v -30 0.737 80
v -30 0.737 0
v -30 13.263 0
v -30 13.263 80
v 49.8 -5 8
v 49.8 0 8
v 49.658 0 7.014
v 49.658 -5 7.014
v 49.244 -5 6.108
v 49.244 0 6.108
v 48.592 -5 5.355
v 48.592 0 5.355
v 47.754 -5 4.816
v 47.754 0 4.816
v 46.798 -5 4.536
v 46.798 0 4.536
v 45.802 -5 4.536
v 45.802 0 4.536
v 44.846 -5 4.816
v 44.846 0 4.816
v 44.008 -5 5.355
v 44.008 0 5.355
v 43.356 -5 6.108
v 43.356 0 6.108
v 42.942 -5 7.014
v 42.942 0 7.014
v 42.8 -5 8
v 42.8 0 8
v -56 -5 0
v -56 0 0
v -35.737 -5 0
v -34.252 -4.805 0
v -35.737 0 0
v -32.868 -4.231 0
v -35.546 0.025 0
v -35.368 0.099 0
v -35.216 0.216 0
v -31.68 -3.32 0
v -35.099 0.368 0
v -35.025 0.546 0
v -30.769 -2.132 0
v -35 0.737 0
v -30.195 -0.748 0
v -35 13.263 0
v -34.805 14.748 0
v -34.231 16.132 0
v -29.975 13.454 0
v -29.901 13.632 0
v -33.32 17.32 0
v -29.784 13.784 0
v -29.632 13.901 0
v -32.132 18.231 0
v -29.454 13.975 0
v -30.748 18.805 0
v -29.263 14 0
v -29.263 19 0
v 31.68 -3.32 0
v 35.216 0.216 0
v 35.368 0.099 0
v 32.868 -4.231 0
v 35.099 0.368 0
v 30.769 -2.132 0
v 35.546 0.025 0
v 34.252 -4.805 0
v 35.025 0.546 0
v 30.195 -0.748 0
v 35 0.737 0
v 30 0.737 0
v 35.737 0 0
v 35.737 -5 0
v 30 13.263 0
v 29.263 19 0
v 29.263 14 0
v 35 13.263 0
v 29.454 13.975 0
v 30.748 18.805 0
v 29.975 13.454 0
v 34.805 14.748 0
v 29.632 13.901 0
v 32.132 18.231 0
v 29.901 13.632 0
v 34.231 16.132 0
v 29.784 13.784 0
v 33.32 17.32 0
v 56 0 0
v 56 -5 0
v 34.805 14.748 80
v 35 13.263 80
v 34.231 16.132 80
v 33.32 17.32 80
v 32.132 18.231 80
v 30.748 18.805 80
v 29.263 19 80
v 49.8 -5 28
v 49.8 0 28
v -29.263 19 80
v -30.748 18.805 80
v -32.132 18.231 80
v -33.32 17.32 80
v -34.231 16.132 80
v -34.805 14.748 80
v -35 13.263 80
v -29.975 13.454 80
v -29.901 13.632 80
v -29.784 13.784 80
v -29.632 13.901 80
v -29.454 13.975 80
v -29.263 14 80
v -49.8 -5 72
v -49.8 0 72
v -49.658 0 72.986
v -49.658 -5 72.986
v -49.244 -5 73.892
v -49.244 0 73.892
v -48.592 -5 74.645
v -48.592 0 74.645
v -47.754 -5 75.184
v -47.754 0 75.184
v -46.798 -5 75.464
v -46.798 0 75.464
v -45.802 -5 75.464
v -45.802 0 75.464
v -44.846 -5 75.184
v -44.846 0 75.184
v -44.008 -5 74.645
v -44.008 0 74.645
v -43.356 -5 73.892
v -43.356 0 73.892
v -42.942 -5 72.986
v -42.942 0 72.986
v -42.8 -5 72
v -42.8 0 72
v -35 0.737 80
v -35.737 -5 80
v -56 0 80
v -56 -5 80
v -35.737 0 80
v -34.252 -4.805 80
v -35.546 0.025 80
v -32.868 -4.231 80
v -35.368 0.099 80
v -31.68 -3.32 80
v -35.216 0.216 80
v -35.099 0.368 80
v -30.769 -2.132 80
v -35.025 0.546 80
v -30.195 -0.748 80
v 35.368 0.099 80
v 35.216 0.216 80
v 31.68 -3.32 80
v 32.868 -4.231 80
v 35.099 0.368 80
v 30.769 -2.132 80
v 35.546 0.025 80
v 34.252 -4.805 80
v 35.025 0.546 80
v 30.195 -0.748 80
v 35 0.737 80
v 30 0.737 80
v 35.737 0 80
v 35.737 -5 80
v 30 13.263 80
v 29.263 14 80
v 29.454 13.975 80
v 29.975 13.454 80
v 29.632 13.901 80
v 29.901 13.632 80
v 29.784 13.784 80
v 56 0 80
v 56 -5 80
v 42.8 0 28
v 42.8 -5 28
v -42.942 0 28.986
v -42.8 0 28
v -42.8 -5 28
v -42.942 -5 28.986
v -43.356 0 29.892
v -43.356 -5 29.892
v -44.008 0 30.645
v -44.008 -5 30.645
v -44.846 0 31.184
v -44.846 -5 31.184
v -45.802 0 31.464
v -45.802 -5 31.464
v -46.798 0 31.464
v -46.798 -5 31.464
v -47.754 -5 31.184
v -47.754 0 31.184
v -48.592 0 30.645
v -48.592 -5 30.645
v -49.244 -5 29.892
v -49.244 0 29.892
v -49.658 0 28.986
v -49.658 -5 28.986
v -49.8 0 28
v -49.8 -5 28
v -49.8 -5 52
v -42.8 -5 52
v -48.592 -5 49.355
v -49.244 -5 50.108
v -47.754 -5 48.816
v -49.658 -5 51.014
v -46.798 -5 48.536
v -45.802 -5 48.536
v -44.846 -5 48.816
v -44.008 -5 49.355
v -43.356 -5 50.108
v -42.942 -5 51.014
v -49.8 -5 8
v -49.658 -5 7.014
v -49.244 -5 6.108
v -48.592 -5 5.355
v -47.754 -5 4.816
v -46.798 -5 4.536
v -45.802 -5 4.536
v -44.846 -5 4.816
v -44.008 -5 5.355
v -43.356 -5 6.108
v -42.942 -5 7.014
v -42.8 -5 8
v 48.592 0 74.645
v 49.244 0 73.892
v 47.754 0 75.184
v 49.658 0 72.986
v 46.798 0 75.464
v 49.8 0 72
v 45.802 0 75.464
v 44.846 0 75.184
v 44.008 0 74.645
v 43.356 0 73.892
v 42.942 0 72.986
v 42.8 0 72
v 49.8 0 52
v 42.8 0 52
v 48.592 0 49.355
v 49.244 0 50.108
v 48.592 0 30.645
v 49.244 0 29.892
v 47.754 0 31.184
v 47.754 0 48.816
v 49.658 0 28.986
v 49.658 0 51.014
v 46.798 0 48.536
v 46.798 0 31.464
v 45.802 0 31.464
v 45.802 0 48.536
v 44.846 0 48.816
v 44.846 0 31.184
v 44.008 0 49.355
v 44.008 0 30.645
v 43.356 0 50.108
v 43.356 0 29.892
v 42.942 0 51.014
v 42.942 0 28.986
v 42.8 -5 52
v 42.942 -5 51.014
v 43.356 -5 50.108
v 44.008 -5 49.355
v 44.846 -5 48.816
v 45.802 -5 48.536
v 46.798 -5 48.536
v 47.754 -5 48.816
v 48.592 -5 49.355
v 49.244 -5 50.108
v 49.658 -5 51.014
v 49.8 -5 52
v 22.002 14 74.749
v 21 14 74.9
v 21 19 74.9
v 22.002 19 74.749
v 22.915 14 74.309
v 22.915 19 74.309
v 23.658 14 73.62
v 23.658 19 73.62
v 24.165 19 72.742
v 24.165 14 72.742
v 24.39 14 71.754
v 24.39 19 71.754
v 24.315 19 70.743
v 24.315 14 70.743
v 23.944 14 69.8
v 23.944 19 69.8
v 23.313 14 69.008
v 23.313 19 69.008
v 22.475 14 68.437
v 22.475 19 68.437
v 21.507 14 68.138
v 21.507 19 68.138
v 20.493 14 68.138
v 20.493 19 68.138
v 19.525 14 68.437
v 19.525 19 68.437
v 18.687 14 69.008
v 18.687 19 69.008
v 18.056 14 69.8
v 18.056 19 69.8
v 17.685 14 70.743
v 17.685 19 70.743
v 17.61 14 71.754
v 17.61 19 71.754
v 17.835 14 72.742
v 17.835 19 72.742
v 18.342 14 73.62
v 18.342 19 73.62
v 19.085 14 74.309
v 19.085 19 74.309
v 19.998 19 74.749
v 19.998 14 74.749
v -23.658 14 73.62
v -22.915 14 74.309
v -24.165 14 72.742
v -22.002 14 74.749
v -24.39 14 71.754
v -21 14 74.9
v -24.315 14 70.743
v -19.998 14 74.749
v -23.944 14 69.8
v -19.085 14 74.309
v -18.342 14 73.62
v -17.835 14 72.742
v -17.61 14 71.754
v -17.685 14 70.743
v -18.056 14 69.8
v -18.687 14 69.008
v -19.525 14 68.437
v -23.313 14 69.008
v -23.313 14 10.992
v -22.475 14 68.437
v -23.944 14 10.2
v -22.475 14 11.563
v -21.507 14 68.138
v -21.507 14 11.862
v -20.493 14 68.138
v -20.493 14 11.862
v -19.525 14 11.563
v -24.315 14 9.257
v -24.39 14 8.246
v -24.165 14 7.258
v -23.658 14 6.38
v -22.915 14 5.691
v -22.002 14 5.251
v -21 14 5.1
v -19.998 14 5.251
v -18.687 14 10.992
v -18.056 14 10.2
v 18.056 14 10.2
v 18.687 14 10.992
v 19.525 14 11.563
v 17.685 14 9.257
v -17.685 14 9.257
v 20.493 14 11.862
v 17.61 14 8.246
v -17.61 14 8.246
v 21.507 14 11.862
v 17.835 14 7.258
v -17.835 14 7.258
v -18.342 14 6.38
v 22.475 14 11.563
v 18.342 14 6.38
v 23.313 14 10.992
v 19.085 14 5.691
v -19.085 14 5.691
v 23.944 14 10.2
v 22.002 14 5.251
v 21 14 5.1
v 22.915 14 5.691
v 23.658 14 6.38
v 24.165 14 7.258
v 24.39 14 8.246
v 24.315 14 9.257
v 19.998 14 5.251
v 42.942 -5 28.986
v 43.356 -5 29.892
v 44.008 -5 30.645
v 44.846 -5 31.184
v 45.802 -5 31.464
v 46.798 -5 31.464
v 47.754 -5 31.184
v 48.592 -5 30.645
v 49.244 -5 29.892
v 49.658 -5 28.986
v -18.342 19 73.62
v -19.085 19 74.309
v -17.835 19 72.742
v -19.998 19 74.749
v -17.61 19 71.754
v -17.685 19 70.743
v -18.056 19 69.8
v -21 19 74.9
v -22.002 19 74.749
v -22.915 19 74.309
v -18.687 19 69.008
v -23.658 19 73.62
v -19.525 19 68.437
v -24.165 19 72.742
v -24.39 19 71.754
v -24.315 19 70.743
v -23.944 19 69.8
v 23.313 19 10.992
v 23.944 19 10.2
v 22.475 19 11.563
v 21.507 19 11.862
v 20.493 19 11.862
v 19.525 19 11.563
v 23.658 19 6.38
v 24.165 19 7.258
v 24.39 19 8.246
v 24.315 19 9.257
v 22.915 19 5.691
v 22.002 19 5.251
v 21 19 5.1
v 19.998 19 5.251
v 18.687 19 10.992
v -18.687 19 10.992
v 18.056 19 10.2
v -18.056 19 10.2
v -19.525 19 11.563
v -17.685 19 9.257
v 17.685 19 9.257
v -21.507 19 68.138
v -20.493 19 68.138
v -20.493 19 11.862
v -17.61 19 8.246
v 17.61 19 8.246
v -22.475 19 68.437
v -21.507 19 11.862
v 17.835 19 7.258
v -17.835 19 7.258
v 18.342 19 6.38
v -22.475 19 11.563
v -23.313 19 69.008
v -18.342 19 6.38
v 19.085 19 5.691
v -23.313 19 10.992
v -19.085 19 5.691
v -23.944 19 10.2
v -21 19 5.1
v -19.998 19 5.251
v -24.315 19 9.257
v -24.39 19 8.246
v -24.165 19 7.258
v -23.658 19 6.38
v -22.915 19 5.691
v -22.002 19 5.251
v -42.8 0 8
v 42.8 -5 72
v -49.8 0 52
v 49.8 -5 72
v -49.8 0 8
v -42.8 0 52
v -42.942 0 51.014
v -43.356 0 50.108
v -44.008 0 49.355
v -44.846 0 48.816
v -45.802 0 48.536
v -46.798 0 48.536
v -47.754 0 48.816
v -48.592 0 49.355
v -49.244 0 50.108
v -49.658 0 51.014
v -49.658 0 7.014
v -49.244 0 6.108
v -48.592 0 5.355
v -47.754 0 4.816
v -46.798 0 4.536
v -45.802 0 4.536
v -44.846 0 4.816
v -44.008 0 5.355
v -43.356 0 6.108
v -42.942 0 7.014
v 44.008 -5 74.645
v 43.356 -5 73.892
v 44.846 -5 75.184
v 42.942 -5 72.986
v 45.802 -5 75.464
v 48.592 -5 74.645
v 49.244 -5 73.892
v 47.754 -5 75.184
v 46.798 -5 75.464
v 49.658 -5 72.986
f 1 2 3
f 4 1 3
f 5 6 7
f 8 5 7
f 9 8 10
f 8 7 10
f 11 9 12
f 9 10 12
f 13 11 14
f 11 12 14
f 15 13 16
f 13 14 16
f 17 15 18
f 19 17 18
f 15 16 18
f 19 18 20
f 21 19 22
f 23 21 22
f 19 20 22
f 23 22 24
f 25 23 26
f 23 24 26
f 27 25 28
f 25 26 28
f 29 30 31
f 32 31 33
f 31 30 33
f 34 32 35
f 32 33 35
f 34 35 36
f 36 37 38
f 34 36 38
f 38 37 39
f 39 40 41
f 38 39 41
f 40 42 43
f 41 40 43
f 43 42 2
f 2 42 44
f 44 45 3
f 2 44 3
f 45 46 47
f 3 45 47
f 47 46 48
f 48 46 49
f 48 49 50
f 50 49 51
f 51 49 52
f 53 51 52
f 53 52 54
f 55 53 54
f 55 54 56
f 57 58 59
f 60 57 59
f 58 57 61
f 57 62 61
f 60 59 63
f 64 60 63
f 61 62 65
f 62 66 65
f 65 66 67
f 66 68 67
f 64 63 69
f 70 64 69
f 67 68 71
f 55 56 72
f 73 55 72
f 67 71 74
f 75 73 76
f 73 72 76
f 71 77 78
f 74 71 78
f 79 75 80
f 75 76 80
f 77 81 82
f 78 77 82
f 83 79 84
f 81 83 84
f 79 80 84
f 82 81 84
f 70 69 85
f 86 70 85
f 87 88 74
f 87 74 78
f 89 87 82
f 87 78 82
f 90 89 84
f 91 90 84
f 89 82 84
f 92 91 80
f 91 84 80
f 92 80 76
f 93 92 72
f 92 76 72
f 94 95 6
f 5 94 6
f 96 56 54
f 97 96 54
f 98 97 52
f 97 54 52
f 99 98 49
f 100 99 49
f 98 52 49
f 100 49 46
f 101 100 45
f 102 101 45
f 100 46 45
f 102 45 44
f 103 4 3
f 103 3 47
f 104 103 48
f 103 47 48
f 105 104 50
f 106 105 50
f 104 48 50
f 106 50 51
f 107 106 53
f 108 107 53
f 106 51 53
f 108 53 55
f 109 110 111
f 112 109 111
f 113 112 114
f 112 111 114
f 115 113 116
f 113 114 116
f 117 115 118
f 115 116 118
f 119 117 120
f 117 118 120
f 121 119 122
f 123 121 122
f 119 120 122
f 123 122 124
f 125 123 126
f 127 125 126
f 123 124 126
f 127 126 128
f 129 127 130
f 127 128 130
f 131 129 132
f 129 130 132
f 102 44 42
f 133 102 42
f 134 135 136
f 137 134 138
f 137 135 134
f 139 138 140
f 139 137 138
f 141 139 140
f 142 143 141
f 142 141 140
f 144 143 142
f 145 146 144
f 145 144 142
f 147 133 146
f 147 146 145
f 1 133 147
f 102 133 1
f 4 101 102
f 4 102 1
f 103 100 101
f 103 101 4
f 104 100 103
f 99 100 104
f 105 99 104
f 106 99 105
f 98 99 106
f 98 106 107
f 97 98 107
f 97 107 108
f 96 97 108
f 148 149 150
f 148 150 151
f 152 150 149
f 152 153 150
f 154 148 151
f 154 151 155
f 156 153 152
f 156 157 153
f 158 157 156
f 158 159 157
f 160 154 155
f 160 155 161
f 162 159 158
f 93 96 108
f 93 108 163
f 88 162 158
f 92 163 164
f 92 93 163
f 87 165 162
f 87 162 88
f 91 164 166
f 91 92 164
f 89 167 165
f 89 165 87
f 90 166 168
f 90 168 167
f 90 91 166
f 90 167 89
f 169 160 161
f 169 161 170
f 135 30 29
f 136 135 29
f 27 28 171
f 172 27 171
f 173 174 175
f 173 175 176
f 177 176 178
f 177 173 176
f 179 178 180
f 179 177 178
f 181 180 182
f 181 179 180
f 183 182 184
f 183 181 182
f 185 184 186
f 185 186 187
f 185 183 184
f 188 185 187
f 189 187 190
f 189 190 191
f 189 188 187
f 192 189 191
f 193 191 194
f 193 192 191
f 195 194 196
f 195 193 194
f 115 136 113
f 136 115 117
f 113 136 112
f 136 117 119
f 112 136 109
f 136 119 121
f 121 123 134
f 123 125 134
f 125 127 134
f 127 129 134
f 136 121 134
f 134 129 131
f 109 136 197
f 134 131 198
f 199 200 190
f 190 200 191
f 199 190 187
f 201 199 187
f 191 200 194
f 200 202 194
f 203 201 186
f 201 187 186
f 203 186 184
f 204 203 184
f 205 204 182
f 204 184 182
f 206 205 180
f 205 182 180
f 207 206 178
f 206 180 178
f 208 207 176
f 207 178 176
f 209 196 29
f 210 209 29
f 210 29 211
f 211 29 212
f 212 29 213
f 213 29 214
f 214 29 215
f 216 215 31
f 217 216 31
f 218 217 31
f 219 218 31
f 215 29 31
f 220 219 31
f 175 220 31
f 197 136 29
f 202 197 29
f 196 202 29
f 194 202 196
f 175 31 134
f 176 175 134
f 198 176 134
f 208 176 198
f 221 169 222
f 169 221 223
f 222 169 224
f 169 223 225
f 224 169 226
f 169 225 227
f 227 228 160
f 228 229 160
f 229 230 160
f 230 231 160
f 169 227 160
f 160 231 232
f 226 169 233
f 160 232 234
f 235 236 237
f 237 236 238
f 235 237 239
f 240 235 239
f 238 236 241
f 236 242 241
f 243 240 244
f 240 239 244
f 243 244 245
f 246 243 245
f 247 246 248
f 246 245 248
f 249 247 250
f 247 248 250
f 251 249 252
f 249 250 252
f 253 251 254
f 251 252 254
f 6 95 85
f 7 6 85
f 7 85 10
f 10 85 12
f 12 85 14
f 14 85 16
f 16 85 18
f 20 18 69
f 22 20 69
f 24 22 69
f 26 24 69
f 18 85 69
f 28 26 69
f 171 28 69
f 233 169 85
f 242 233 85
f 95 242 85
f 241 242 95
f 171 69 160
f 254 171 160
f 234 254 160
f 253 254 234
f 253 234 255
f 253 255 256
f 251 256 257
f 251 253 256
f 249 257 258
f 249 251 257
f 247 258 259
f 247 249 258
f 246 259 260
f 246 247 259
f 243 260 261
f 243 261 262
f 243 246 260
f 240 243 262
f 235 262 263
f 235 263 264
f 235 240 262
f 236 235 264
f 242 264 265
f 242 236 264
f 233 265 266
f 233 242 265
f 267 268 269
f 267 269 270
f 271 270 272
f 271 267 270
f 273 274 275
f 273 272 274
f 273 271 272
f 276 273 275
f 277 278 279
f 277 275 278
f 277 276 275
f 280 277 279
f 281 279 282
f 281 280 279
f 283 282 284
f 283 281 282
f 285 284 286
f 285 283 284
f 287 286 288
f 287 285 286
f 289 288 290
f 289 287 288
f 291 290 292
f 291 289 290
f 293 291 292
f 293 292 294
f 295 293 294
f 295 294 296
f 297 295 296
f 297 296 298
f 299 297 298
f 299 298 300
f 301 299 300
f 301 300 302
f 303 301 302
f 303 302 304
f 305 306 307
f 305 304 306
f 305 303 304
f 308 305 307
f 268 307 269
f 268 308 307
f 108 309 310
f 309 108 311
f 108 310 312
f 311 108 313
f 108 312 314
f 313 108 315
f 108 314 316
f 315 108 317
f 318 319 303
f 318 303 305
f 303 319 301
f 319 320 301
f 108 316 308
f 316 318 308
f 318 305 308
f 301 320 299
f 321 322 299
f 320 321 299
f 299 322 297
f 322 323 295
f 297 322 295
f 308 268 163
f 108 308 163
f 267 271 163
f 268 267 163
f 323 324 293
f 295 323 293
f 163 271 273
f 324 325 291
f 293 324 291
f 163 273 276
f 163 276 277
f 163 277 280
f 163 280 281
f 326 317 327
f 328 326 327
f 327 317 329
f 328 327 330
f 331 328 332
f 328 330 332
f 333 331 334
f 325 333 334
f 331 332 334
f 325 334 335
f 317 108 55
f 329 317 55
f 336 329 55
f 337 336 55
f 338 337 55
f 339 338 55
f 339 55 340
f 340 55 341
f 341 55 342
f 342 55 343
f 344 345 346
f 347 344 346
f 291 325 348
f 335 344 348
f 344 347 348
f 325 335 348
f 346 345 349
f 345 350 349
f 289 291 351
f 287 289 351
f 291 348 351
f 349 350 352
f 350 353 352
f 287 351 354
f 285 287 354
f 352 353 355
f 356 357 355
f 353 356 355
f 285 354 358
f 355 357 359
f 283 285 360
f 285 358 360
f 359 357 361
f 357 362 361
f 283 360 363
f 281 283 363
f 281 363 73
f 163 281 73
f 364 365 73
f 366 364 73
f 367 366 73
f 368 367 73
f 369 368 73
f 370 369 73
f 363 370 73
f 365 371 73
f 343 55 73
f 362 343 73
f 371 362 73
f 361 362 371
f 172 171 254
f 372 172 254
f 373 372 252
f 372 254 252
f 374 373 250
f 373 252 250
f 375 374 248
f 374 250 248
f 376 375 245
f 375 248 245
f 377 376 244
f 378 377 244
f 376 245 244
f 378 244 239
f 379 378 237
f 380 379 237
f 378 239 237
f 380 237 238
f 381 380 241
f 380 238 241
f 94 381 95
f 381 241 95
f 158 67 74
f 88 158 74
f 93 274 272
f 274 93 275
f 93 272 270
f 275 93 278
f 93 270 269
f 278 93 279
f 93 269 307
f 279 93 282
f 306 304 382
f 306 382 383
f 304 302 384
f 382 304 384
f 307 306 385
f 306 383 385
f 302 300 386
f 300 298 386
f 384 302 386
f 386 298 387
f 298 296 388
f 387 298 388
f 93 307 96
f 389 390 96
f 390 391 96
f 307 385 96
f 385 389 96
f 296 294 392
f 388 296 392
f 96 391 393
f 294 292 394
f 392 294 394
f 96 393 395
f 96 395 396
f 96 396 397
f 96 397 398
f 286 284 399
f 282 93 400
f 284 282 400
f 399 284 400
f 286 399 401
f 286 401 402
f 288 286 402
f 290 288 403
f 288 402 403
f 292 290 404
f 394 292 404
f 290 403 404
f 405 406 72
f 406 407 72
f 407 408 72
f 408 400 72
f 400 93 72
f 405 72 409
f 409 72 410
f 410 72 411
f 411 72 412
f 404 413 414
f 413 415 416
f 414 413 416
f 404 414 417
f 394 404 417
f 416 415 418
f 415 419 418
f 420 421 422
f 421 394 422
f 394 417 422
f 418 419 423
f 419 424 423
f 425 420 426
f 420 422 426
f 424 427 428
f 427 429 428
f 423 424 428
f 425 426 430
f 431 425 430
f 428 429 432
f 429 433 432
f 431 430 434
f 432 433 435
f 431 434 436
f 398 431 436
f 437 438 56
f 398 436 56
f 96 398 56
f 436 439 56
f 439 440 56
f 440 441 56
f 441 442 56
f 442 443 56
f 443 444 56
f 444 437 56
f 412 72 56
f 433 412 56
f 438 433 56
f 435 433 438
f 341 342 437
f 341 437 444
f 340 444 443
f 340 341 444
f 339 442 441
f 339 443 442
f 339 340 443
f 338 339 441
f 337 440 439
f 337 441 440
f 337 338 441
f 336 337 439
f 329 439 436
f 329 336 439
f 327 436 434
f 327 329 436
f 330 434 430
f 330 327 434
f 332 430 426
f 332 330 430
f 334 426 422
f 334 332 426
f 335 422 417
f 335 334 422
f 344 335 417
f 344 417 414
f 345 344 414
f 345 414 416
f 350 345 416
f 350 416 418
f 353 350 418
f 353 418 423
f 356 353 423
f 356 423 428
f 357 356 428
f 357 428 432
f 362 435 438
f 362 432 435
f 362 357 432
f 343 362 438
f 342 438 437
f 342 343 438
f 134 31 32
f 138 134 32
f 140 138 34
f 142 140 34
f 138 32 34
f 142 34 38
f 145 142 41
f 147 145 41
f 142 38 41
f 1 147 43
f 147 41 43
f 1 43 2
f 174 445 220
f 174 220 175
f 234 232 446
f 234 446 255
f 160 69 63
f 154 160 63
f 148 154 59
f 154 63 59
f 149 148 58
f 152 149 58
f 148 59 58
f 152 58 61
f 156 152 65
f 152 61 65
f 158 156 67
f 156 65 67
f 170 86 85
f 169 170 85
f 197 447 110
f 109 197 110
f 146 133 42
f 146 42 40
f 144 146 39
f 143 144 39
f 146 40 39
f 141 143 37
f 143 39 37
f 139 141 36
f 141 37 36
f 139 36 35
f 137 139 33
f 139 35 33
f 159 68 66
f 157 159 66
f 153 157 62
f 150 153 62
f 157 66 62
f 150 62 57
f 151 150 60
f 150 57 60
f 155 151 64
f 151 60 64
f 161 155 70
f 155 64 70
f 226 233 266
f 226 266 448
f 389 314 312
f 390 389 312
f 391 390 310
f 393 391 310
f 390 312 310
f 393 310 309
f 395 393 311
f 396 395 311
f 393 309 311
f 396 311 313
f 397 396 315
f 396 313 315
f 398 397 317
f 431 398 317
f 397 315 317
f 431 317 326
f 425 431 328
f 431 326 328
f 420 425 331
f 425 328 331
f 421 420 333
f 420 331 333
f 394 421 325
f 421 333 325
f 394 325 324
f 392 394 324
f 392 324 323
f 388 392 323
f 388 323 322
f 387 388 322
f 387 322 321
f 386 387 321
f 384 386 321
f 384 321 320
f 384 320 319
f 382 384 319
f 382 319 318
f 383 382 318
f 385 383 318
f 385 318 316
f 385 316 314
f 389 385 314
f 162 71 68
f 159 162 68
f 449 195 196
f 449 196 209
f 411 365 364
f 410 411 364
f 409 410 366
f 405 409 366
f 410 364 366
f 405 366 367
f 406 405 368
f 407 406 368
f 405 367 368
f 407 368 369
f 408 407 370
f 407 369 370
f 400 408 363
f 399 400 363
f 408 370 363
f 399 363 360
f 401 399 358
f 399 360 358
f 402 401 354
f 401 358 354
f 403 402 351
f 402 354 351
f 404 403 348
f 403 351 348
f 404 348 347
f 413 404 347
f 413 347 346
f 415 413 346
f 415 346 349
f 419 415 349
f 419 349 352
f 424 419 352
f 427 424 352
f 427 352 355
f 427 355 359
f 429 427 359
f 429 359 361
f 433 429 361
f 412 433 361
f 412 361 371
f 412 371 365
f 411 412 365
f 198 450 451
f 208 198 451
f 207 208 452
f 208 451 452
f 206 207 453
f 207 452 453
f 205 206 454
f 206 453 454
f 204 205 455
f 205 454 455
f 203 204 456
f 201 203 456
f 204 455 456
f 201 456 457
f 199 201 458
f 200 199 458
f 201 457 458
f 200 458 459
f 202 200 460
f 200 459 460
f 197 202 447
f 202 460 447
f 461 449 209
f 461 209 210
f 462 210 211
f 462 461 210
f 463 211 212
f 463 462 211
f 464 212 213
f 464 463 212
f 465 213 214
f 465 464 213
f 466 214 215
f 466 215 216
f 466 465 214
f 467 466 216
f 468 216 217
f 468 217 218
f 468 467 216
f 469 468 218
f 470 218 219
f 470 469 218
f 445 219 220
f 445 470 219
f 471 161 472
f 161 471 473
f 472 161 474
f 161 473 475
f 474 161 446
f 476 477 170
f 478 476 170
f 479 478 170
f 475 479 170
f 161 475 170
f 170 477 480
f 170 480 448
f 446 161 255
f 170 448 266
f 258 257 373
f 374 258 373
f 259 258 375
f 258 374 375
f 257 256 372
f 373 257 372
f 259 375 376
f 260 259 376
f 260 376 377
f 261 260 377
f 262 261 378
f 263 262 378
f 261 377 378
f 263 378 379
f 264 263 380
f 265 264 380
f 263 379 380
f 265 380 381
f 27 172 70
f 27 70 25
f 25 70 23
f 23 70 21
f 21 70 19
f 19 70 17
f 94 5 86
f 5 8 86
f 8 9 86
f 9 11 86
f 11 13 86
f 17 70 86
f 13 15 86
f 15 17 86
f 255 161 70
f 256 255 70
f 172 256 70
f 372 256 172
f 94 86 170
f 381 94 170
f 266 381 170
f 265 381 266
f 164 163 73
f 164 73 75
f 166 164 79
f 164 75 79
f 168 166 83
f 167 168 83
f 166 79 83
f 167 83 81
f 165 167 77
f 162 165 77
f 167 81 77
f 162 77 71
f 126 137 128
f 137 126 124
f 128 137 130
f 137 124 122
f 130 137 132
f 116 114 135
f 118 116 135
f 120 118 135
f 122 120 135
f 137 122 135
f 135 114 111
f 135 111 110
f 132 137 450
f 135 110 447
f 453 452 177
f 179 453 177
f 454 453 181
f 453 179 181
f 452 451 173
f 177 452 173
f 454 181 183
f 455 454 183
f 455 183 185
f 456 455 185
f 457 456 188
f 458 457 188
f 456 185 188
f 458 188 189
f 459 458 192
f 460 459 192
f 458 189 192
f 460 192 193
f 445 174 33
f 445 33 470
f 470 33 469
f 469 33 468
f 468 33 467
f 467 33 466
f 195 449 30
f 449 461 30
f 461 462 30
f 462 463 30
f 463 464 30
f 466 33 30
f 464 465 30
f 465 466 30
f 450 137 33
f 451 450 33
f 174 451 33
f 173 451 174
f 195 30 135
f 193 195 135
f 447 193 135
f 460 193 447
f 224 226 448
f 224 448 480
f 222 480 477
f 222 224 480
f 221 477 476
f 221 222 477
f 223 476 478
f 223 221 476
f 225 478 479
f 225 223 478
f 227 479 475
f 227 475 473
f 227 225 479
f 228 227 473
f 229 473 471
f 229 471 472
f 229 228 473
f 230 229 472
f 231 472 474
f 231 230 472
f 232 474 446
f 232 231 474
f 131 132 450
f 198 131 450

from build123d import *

# Parameters (mm, degrees)
SM_BASE_FLANGE_1_DEPTH  = 80
HOLE_WIZARD_6_8_6_8_2_D = 6.8
CUT_EXTRUDE_3_DEPTH     = 5
MIRROR_5_COPY_1_D       = 6.8
MIRROR_5_COPY_2_DEPTH   = 5


# Sheet-metal steps are written as plain solids
with BuildPart() as part:
    # 草图3 → 基体-法兰1 (new body)
    with BuildSketch(Plane.XY):
        with BuildLine():
            Line((56, 0), (35.7366, 0))
            ThreePointArc((35.7366, 0), (35.215745145, 0.215745145), (35, 0.7366))
            Line((35, 0.7366), (35, 13.2634))
            ThreePointArc((35, 13.2634), (33.319788761, 17.319788761), (29.2634, 19))
            Line((29.2634, 19), (-29.2634, 19))
            ThreePointArc((-29.2634, 19), (-33.319788761, 17.319788761), (-35, 13.2634))
            Line((-35, 13.2634), (-35, 0.7366))
            ThreePointArc((-35, 0.7366), (-35.215745145, 0.215745145), (-35.7366, 0))
            Line((-35.7366, 0), (-56, 0))
            Line((-56, 0), (-56, -5))
            Line((-56, -5), (-35.7366, -5))
            ThreePointArc((-35.7366, -5), (-31.680211239, -3.319788761), (-30, 0.7366))
            Line((-30, 0.7366), (-30, 13.2634))
            ThreePointArc((-30, 13.2634), (-29.784254855, 13.784254855), (-29.2634, 14))
            Line((-29.2634, 14), (29.2634, 14))
            ThreePointArc((29.2634, 14), (29.784254855, 13.784254855), (30, 13.2634))
            Line((30, 13.2634), (30, 0.7366))
            ThreePointArc((30, 0.7366), (31.680211239, -3.319788761), (35.7366, -5))
            Line((35.7366, -5), (56, -5))
            Line((56, -5), (56, 0))
        make_face()
    extrude(amount=SM_BASE_FLANGE_1_DEPTH)

    # Ø6.8 (6.8) 直径孔2 (through all)
    with Locations(Plane(origin=(21, 19, 8.5), x_dir=(0, 0, 1), z_dir=(0, 1, 0))):
        with Locations((0, 0)):
            hole_wizard_6_8_6_8_2 = Hole(HOLE_WIZARD_6_8_6_8_2_D / 2)

    # 草图10 → 切除-拉伸3 (cut)
    with BuildSketch(Plane(origin=(0, 0, 0), x_dir=(1, 0, 0), z_dir=(0, 1, 0))):
        with BuildLine():
            Line((49.8, -52), (49.8, -72))
            ThreePointArc((49.8, -72), (46.3, -75.5), (42.8, -72))
            Line((42.8, -72), (42.8, -52))
            ThreePointArc((42.8, -52), (46.3, -48.5), (49.8, -52))
        make_face()
    cut_extrude_3 = extrude(amount=-CUT_EXTRUDE_3_DEPTH, mode=Mode.SUBTRACT)

    # 镜向4: Ø6.8 (6.8) 直径孔2, 切除-拉伸3 across plane
    add(hole_wizard_6_8_6_8_2.mirror(Plane(origin=(0, 0, 40), x_dir=(1, 0, 0), z_dir=(0, 0, -1))), mode=Mode.SUBTRACT)
    add(cut_extrude_3.mirror(Plane(origin=(0, 0, 40), x_dir=(1, 0, 0), z_dir=(0, 0, -1))), mode=Mode.SUBTRACT)

    # 镜向5: Ø6.8 (6.8) 直径孔2, 切除-拉伸3 across plane
    add(hole_wizard_6_8_6_8_2.mirror(Plane(origin=(0, 0, 0), x_dir=(0, 0, 1), z_dir=(1, 0, 0))), mode=Mode.SUBTRACT)
    add(cut_extrude_3.mirror(Plane(origin=(0, 0, 0), x_dir=(0, 0, 1), z_dir=(1, 0, 0))), mode=Mode.SUBTRACT)

    # 镜向5 copy 1 (through all)
    with Locations(Plane(origin=(-21, 19, 71.5), x_dir=(0, 0, -1), z_dir=(0, 1, 0))):
        with Locations((0, 0)):
            Hole(MIRROR_5_COPY_1_D / 2)

    # 镜向5 copy 2 sketch → 镜向5 copy 2 (cut)
    with BuildSketch(Plane(origin=(0, 0, 80), x_dir=(-1, 0, 0), z_dir=(0, 1, 0))):
        with BuildLine():
            Line((49.8, -52), (49.8, -72))
            ThreePointArc((49.8, -72), (46.3, -75.5), (42.8, -72))
            Line((42.8, -72), (42.8, -52))
            ThreePointArc((42.8, -52), (46.3, -48.5), (49.8, -52))
        make_face()
    extrude(amount=-MIRROR_5_COPY_2_DEPTH, mode=Mode.SUBTRACT)


solid = part.part
